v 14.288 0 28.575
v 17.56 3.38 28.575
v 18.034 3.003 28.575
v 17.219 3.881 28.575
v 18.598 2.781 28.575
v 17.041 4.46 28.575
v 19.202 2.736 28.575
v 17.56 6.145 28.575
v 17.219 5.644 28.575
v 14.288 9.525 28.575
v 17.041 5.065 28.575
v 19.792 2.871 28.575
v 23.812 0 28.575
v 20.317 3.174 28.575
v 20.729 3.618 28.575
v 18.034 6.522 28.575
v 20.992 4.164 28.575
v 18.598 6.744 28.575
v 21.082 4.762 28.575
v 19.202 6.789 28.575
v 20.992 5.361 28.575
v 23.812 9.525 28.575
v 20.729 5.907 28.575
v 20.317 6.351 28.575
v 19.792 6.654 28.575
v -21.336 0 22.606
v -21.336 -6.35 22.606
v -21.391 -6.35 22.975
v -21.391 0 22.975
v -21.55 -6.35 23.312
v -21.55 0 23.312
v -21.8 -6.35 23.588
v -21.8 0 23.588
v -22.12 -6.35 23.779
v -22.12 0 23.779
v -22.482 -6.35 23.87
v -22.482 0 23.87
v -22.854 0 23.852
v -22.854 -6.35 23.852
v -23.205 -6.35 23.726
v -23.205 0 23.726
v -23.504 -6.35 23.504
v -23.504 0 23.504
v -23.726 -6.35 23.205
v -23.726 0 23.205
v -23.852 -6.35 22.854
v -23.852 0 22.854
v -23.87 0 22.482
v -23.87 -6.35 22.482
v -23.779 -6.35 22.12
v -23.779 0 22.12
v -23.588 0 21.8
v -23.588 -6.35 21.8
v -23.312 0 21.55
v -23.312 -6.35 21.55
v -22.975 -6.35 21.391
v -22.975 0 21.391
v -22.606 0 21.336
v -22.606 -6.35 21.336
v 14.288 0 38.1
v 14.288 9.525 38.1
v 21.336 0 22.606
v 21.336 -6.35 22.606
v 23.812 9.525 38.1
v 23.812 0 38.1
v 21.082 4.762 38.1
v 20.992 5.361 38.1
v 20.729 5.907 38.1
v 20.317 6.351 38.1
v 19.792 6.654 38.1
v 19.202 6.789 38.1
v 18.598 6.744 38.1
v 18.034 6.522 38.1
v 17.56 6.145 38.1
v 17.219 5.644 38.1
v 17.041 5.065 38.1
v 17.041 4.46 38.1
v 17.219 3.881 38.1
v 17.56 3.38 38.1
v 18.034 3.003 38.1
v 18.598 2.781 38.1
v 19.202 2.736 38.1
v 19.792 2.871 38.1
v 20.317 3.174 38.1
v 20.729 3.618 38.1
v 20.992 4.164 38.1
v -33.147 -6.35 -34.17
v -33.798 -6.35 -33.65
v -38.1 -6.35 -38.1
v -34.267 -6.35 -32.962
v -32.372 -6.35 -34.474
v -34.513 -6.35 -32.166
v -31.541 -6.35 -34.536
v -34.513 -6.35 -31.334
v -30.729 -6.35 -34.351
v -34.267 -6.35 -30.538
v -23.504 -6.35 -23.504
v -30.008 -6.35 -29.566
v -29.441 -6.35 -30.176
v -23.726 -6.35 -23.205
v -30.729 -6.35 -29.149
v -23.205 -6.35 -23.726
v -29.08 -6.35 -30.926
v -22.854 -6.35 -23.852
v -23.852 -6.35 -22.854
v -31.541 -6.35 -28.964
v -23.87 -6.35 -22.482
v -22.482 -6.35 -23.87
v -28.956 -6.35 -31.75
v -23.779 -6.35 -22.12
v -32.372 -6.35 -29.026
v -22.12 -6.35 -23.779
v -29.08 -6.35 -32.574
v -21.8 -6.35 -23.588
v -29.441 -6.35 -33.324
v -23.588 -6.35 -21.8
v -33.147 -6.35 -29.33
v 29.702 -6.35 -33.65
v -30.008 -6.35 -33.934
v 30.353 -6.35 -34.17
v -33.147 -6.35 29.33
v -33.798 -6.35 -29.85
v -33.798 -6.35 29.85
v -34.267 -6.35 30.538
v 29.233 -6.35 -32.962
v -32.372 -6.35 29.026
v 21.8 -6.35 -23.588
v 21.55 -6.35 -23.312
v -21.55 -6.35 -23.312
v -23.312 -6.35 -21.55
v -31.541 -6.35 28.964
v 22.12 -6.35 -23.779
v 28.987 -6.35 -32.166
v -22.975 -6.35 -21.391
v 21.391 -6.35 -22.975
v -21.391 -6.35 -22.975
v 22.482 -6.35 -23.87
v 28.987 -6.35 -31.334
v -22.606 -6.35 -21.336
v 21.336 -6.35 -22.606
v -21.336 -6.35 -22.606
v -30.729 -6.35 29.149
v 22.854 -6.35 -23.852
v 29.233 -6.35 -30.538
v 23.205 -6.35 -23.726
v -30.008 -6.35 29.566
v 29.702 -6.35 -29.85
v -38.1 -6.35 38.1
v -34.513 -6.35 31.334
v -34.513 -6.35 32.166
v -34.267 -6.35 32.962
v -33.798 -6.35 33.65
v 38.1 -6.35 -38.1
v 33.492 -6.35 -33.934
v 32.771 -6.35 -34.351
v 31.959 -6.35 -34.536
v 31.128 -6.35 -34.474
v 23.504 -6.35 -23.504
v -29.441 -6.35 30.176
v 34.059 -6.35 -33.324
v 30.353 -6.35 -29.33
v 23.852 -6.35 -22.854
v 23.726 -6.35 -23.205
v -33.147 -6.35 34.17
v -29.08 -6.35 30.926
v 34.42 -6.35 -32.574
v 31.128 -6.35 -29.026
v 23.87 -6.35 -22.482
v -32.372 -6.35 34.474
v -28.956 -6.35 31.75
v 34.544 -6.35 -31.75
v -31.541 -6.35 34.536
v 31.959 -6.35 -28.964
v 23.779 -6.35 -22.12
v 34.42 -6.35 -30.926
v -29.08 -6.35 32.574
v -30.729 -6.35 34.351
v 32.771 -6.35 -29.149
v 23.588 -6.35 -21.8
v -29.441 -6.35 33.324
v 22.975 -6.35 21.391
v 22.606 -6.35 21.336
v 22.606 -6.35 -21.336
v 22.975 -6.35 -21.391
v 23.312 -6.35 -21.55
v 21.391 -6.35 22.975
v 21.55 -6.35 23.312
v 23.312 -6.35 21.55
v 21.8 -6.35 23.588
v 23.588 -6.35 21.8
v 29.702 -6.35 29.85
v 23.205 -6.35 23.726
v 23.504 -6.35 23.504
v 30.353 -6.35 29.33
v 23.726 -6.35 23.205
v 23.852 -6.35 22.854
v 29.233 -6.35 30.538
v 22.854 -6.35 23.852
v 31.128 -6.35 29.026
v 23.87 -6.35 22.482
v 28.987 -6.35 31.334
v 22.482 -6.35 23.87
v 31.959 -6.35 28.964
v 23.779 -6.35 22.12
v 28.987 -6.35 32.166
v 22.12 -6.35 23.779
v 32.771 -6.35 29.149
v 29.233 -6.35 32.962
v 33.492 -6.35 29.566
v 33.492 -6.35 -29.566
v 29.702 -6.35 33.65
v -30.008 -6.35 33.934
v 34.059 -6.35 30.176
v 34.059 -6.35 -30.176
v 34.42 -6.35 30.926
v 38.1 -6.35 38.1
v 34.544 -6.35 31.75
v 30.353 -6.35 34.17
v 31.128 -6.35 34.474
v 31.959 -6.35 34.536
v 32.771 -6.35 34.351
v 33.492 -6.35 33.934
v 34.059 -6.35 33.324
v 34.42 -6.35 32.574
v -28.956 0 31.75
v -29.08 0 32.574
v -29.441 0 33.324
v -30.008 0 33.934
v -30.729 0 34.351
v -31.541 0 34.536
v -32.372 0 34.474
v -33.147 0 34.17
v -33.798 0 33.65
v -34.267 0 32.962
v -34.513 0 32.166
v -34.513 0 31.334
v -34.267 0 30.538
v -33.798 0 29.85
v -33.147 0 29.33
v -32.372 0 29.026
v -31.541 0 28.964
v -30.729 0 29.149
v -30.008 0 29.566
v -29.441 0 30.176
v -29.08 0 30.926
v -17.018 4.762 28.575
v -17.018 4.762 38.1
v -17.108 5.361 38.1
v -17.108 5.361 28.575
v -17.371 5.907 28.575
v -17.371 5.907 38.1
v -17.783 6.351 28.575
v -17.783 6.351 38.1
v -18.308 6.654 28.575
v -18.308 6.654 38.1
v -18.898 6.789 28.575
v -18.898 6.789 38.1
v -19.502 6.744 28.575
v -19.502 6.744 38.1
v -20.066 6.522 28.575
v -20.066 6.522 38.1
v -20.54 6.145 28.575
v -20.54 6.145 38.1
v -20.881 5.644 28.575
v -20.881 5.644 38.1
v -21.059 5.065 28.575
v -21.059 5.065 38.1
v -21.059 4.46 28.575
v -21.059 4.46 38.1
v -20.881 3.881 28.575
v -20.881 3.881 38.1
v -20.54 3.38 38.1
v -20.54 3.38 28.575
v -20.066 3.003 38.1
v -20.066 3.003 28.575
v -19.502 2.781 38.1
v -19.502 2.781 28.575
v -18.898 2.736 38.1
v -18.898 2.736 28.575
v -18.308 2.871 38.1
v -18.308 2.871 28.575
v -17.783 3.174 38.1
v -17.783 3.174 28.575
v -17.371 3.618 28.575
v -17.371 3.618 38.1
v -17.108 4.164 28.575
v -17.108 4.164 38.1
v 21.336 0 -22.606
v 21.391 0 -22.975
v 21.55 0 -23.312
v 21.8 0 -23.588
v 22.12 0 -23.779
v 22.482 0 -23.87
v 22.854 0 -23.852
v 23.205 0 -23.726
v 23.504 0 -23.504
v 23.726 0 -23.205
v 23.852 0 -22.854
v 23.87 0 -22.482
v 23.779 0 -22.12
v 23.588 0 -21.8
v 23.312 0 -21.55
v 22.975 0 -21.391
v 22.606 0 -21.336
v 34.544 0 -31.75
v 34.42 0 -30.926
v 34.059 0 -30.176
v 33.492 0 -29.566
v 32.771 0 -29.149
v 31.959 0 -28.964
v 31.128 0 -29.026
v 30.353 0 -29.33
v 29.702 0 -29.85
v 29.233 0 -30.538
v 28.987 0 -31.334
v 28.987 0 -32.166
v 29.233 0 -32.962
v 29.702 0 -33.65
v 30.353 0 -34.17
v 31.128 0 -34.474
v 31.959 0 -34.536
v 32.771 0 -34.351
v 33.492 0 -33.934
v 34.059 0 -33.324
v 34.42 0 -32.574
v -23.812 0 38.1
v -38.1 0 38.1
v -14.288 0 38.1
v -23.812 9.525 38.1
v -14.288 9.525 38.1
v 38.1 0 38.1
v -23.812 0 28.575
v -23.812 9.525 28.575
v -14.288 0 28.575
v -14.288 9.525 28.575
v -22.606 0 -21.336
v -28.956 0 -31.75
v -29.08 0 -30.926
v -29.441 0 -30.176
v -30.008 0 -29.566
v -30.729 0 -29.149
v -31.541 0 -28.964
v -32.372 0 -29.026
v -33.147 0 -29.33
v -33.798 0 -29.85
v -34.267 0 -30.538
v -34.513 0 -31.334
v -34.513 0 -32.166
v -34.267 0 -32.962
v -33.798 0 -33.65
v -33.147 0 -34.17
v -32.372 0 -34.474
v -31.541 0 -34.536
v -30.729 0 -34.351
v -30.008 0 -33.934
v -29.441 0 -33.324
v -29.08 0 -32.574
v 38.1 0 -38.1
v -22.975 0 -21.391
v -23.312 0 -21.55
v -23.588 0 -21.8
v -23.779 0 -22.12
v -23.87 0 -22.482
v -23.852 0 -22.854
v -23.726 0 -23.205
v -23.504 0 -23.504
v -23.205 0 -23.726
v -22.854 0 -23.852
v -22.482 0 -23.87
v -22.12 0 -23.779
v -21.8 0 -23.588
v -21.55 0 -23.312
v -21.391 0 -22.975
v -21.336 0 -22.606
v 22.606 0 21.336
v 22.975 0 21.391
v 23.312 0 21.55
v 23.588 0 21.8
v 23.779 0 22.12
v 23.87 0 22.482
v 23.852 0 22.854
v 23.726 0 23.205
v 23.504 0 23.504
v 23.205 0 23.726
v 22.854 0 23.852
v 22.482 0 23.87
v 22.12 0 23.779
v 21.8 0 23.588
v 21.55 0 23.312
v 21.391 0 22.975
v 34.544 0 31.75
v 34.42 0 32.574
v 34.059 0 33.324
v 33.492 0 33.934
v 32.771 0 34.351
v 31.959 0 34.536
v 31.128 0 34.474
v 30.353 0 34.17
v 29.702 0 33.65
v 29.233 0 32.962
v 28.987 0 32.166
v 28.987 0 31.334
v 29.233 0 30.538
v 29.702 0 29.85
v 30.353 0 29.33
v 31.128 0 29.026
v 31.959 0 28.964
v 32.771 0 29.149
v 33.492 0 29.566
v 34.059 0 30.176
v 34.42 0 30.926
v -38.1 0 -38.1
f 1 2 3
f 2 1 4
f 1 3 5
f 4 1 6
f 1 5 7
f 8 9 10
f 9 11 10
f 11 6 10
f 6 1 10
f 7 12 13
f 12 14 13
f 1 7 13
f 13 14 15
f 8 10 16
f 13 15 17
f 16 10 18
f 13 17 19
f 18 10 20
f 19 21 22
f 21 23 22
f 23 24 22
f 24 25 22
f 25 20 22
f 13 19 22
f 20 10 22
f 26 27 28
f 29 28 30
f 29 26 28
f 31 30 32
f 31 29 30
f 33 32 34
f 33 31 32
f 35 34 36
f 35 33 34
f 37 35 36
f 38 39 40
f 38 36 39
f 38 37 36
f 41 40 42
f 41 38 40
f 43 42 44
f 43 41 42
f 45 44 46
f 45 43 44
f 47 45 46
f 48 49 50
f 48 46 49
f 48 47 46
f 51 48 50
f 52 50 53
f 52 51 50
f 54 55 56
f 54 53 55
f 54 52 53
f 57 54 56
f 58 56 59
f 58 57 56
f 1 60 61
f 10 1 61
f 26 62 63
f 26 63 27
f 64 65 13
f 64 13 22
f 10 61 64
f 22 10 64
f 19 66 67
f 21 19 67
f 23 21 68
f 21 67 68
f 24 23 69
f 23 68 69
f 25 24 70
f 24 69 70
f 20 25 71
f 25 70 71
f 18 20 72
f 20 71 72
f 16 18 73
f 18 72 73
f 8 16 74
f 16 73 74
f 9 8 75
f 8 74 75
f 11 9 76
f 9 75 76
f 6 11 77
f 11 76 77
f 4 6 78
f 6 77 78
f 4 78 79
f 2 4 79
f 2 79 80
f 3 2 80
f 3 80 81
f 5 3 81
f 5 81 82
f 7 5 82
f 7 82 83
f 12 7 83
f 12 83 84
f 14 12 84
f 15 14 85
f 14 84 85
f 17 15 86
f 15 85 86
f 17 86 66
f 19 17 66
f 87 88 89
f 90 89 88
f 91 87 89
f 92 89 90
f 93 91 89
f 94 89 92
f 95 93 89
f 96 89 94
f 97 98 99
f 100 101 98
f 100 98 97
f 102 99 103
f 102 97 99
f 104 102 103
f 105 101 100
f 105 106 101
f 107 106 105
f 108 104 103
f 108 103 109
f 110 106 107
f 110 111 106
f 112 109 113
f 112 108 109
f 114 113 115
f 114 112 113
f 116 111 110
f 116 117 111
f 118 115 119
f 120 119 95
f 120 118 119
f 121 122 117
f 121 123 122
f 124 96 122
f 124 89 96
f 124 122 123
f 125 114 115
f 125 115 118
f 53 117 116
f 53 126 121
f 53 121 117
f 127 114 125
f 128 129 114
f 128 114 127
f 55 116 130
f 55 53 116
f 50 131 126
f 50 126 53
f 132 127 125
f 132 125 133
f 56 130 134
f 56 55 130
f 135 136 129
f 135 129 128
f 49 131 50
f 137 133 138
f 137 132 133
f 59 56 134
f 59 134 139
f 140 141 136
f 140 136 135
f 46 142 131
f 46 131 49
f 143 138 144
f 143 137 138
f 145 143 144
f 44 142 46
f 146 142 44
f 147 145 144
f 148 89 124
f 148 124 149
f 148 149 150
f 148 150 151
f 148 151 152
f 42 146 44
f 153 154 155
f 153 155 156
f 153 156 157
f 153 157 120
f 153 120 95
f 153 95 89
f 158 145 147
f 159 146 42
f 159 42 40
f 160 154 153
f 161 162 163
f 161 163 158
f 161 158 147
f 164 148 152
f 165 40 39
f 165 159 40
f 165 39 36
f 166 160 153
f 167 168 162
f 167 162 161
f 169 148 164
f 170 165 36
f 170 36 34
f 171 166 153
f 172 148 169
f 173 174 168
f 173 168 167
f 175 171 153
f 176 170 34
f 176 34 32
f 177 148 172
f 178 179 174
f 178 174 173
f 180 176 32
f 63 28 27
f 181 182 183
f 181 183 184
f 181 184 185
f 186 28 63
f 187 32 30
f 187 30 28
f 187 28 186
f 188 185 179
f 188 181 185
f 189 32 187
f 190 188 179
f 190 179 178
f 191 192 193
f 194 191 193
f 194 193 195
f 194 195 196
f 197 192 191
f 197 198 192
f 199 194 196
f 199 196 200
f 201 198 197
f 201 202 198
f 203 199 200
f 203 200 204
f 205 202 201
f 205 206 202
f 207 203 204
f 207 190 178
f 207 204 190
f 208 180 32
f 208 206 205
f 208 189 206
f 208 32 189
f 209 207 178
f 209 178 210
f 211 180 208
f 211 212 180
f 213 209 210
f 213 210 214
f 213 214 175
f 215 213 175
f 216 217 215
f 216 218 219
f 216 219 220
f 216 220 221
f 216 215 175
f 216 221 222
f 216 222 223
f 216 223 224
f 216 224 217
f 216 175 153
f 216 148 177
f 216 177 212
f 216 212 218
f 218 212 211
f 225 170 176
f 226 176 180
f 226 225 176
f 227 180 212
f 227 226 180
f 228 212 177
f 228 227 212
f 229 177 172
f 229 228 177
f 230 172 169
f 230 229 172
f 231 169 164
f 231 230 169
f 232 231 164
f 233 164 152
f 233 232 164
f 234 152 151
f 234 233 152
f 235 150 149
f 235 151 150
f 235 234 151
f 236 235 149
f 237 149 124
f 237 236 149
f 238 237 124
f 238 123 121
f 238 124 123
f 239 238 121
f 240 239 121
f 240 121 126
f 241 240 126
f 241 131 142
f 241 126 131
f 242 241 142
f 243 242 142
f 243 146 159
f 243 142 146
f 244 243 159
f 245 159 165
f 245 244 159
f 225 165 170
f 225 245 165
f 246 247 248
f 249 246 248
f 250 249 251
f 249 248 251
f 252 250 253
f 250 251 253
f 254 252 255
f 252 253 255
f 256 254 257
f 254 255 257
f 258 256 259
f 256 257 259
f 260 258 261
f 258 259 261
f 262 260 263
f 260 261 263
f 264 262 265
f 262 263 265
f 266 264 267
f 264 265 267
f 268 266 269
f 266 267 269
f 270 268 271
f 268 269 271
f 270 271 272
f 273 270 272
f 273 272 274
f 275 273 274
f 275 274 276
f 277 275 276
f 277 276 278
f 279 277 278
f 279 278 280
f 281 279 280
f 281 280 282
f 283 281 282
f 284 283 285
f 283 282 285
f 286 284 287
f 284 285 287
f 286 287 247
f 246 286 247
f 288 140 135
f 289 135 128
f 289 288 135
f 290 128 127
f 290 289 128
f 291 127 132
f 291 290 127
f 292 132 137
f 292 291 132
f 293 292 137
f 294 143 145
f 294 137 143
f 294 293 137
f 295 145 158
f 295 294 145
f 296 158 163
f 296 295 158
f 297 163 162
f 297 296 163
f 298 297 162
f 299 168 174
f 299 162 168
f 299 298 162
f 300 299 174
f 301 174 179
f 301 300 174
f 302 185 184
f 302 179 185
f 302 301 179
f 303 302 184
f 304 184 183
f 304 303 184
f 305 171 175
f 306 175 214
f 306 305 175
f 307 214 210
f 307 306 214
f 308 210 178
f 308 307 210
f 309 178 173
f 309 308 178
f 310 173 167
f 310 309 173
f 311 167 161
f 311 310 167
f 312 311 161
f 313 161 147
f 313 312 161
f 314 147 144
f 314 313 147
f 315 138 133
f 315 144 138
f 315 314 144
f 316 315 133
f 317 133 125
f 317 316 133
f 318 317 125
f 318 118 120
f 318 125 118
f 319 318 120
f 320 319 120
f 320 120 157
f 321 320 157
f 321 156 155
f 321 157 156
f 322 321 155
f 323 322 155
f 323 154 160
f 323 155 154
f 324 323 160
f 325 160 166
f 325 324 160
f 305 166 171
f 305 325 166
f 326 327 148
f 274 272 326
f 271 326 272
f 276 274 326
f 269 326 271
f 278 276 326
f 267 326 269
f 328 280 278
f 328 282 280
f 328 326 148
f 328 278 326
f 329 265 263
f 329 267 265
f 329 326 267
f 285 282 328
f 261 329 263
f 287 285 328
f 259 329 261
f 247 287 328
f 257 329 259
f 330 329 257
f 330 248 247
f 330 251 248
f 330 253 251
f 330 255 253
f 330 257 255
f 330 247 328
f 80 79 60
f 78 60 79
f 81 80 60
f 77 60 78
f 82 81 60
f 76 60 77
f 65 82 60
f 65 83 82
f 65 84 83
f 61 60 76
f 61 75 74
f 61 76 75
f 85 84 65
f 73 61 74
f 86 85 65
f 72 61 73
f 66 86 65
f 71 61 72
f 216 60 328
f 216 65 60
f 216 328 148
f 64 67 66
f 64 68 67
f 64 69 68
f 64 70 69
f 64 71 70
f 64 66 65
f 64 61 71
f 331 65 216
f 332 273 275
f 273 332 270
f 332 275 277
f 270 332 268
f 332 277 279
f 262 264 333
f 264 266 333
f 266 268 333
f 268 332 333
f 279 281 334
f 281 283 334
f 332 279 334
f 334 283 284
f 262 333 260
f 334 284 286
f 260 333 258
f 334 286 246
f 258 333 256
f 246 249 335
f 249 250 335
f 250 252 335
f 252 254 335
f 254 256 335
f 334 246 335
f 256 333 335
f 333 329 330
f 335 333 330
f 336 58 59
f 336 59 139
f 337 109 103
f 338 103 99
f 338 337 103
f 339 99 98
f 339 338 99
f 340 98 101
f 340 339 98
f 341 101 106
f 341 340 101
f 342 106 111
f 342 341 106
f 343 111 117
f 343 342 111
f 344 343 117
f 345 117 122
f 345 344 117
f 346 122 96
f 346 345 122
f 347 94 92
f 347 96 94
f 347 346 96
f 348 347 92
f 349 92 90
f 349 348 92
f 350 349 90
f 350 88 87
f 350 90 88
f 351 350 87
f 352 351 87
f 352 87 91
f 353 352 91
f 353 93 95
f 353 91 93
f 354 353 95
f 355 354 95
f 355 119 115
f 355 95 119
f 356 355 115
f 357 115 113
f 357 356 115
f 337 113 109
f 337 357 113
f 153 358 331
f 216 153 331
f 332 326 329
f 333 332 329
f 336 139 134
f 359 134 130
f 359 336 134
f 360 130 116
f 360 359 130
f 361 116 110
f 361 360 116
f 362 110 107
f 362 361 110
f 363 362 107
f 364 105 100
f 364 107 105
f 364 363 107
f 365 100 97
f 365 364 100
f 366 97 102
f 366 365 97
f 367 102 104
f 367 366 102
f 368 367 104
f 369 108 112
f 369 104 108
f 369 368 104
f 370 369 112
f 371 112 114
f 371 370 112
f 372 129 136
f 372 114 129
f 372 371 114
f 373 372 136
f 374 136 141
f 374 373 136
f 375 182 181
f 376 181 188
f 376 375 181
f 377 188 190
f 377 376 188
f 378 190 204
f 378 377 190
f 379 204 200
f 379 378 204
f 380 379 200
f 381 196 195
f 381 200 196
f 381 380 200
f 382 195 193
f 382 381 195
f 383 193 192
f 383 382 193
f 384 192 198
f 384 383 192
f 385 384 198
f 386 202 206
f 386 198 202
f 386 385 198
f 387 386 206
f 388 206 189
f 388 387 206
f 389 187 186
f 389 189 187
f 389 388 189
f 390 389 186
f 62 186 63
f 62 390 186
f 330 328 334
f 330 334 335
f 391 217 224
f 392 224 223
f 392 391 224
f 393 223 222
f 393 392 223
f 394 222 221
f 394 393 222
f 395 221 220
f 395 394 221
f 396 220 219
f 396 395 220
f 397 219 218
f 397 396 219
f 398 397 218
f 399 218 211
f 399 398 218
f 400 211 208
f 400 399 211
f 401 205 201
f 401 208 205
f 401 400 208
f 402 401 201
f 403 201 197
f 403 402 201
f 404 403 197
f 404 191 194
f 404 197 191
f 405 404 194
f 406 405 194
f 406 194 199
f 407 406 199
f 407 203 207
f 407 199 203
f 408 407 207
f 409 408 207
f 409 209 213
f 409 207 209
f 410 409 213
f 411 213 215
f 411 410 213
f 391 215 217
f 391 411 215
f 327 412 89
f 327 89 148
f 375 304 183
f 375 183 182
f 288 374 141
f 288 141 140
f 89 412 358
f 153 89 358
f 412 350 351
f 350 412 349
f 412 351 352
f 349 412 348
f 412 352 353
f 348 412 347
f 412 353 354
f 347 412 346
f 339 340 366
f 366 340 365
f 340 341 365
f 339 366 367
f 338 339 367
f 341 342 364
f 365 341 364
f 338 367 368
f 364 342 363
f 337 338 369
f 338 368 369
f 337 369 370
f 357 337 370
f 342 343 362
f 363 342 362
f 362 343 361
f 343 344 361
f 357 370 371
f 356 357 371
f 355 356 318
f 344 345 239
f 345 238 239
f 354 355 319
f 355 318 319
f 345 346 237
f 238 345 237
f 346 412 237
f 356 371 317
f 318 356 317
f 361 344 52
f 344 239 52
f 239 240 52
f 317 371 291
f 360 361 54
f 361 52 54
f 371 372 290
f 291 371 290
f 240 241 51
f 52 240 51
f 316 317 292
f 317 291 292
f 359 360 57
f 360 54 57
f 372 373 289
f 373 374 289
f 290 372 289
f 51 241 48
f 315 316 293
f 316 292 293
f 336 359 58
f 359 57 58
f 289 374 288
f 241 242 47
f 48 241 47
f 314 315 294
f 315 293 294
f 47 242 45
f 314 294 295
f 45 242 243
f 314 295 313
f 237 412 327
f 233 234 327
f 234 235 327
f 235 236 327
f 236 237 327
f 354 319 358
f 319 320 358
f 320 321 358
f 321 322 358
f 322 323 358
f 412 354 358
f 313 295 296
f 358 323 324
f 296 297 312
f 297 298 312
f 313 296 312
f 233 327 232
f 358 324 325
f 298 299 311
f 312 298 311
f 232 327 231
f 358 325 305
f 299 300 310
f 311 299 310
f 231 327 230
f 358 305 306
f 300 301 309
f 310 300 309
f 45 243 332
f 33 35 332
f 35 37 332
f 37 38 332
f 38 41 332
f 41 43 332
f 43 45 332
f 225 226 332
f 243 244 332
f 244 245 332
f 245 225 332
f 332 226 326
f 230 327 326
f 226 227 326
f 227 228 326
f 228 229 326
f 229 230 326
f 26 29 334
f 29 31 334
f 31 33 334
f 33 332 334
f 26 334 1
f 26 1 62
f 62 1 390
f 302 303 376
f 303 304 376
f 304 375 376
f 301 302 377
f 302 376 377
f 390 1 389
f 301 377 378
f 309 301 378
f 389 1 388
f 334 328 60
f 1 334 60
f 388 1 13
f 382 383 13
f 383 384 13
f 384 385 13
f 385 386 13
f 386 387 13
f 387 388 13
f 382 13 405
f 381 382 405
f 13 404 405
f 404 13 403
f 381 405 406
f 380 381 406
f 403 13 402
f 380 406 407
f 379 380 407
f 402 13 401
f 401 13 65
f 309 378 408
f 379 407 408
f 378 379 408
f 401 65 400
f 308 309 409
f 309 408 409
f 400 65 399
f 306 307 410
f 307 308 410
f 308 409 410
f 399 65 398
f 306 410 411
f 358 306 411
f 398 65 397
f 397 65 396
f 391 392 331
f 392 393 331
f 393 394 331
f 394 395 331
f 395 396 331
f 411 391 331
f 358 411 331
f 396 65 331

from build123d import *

# Parameters (mm, degrees)
F0_W     = 76.2
F0_H     = 76.2
F3_DEPTH = 6.35
F4_DEPTH = 6.351
F2_R     = 2.794
F5_DEPTH = 6.351
F6_W     = 9.525
F6_H     = 9.525
F6_R     = 2.032
F7_DEPTH = 9.525


with BuildPart() as f3:
    # F0 (on Front) → F3 (new body)
    with BuildSketch(Plane.XZ):
        Rectangle(F0_W, F0_H)
    extrude(amount=F3_DEPTH)

    # F1 (on Front) → F4 (cut, through all)
    with BuildSketch(Plane.XZ):
        with BuildLine():
            Line((21.336, 22.606), (-21.336, 22.606))
            ThreePointArc((-21.336, 22.606), (-23.504026, 23.504026), (-22.606, 21.336))
            Line((-22.606, 21.336), (-22.606, -21.336))
            ThreePointArc((-22.606, -21.336), (-23.504026, -23.504026), (-21.336, -22.606))
            Line((-21.336, -22.606), (21.336, -22.606))
            ThreePointArc((21.336, -22.606), (23.504026, -23.504026), (22.606, -21.336))
            Line((22.606, -21.336), (22.606, 21.336))
            ThreePointArc((22.606, 21.336), (23.504026, 23.504026), (21.336, 22.606))
        make_face()
    extrude(amount=F4_DEPTH, mode=Mode.SUBTRACT)

    # F2 (on Front) → F5 (cut, through all)
    with BuildSketch(Plane.XZ):
        with Locations((-31.75, 31.75)):
            Circle(F2_R)
        with Locations((-31.75, -31.75)):
            Circle(F2_R)
        with Locations((31.75, -31.75)):
            Circle(F2_R)
        with Locations((31.75, 31.75)):
            Circle(F2_R)
    extrude(amount=F5_DEPTH, mode=Mode.SUBTRACT)

    # F6 (on face) → F7 (join)
    with BuildSketch(Plane.XY.offset(38.1)):
        with Locations((-19.05, 4.7625)):
            Rectangle(F6_W, F6_H)
        with Locations((-19.05, 4.7625)):
            Circle(F6_R, mode=Mode.SUBTRACT)
        with Locations((19.05, 4.7625)):
            Rectangle(F6_W, F6_H)
        with Locations((19.05, 4.7625)):
            Circle(F6_R, mode=Mode.SUBTRACT)
    extrude(amount=-F7_DEPTH)


solid = f3.part
